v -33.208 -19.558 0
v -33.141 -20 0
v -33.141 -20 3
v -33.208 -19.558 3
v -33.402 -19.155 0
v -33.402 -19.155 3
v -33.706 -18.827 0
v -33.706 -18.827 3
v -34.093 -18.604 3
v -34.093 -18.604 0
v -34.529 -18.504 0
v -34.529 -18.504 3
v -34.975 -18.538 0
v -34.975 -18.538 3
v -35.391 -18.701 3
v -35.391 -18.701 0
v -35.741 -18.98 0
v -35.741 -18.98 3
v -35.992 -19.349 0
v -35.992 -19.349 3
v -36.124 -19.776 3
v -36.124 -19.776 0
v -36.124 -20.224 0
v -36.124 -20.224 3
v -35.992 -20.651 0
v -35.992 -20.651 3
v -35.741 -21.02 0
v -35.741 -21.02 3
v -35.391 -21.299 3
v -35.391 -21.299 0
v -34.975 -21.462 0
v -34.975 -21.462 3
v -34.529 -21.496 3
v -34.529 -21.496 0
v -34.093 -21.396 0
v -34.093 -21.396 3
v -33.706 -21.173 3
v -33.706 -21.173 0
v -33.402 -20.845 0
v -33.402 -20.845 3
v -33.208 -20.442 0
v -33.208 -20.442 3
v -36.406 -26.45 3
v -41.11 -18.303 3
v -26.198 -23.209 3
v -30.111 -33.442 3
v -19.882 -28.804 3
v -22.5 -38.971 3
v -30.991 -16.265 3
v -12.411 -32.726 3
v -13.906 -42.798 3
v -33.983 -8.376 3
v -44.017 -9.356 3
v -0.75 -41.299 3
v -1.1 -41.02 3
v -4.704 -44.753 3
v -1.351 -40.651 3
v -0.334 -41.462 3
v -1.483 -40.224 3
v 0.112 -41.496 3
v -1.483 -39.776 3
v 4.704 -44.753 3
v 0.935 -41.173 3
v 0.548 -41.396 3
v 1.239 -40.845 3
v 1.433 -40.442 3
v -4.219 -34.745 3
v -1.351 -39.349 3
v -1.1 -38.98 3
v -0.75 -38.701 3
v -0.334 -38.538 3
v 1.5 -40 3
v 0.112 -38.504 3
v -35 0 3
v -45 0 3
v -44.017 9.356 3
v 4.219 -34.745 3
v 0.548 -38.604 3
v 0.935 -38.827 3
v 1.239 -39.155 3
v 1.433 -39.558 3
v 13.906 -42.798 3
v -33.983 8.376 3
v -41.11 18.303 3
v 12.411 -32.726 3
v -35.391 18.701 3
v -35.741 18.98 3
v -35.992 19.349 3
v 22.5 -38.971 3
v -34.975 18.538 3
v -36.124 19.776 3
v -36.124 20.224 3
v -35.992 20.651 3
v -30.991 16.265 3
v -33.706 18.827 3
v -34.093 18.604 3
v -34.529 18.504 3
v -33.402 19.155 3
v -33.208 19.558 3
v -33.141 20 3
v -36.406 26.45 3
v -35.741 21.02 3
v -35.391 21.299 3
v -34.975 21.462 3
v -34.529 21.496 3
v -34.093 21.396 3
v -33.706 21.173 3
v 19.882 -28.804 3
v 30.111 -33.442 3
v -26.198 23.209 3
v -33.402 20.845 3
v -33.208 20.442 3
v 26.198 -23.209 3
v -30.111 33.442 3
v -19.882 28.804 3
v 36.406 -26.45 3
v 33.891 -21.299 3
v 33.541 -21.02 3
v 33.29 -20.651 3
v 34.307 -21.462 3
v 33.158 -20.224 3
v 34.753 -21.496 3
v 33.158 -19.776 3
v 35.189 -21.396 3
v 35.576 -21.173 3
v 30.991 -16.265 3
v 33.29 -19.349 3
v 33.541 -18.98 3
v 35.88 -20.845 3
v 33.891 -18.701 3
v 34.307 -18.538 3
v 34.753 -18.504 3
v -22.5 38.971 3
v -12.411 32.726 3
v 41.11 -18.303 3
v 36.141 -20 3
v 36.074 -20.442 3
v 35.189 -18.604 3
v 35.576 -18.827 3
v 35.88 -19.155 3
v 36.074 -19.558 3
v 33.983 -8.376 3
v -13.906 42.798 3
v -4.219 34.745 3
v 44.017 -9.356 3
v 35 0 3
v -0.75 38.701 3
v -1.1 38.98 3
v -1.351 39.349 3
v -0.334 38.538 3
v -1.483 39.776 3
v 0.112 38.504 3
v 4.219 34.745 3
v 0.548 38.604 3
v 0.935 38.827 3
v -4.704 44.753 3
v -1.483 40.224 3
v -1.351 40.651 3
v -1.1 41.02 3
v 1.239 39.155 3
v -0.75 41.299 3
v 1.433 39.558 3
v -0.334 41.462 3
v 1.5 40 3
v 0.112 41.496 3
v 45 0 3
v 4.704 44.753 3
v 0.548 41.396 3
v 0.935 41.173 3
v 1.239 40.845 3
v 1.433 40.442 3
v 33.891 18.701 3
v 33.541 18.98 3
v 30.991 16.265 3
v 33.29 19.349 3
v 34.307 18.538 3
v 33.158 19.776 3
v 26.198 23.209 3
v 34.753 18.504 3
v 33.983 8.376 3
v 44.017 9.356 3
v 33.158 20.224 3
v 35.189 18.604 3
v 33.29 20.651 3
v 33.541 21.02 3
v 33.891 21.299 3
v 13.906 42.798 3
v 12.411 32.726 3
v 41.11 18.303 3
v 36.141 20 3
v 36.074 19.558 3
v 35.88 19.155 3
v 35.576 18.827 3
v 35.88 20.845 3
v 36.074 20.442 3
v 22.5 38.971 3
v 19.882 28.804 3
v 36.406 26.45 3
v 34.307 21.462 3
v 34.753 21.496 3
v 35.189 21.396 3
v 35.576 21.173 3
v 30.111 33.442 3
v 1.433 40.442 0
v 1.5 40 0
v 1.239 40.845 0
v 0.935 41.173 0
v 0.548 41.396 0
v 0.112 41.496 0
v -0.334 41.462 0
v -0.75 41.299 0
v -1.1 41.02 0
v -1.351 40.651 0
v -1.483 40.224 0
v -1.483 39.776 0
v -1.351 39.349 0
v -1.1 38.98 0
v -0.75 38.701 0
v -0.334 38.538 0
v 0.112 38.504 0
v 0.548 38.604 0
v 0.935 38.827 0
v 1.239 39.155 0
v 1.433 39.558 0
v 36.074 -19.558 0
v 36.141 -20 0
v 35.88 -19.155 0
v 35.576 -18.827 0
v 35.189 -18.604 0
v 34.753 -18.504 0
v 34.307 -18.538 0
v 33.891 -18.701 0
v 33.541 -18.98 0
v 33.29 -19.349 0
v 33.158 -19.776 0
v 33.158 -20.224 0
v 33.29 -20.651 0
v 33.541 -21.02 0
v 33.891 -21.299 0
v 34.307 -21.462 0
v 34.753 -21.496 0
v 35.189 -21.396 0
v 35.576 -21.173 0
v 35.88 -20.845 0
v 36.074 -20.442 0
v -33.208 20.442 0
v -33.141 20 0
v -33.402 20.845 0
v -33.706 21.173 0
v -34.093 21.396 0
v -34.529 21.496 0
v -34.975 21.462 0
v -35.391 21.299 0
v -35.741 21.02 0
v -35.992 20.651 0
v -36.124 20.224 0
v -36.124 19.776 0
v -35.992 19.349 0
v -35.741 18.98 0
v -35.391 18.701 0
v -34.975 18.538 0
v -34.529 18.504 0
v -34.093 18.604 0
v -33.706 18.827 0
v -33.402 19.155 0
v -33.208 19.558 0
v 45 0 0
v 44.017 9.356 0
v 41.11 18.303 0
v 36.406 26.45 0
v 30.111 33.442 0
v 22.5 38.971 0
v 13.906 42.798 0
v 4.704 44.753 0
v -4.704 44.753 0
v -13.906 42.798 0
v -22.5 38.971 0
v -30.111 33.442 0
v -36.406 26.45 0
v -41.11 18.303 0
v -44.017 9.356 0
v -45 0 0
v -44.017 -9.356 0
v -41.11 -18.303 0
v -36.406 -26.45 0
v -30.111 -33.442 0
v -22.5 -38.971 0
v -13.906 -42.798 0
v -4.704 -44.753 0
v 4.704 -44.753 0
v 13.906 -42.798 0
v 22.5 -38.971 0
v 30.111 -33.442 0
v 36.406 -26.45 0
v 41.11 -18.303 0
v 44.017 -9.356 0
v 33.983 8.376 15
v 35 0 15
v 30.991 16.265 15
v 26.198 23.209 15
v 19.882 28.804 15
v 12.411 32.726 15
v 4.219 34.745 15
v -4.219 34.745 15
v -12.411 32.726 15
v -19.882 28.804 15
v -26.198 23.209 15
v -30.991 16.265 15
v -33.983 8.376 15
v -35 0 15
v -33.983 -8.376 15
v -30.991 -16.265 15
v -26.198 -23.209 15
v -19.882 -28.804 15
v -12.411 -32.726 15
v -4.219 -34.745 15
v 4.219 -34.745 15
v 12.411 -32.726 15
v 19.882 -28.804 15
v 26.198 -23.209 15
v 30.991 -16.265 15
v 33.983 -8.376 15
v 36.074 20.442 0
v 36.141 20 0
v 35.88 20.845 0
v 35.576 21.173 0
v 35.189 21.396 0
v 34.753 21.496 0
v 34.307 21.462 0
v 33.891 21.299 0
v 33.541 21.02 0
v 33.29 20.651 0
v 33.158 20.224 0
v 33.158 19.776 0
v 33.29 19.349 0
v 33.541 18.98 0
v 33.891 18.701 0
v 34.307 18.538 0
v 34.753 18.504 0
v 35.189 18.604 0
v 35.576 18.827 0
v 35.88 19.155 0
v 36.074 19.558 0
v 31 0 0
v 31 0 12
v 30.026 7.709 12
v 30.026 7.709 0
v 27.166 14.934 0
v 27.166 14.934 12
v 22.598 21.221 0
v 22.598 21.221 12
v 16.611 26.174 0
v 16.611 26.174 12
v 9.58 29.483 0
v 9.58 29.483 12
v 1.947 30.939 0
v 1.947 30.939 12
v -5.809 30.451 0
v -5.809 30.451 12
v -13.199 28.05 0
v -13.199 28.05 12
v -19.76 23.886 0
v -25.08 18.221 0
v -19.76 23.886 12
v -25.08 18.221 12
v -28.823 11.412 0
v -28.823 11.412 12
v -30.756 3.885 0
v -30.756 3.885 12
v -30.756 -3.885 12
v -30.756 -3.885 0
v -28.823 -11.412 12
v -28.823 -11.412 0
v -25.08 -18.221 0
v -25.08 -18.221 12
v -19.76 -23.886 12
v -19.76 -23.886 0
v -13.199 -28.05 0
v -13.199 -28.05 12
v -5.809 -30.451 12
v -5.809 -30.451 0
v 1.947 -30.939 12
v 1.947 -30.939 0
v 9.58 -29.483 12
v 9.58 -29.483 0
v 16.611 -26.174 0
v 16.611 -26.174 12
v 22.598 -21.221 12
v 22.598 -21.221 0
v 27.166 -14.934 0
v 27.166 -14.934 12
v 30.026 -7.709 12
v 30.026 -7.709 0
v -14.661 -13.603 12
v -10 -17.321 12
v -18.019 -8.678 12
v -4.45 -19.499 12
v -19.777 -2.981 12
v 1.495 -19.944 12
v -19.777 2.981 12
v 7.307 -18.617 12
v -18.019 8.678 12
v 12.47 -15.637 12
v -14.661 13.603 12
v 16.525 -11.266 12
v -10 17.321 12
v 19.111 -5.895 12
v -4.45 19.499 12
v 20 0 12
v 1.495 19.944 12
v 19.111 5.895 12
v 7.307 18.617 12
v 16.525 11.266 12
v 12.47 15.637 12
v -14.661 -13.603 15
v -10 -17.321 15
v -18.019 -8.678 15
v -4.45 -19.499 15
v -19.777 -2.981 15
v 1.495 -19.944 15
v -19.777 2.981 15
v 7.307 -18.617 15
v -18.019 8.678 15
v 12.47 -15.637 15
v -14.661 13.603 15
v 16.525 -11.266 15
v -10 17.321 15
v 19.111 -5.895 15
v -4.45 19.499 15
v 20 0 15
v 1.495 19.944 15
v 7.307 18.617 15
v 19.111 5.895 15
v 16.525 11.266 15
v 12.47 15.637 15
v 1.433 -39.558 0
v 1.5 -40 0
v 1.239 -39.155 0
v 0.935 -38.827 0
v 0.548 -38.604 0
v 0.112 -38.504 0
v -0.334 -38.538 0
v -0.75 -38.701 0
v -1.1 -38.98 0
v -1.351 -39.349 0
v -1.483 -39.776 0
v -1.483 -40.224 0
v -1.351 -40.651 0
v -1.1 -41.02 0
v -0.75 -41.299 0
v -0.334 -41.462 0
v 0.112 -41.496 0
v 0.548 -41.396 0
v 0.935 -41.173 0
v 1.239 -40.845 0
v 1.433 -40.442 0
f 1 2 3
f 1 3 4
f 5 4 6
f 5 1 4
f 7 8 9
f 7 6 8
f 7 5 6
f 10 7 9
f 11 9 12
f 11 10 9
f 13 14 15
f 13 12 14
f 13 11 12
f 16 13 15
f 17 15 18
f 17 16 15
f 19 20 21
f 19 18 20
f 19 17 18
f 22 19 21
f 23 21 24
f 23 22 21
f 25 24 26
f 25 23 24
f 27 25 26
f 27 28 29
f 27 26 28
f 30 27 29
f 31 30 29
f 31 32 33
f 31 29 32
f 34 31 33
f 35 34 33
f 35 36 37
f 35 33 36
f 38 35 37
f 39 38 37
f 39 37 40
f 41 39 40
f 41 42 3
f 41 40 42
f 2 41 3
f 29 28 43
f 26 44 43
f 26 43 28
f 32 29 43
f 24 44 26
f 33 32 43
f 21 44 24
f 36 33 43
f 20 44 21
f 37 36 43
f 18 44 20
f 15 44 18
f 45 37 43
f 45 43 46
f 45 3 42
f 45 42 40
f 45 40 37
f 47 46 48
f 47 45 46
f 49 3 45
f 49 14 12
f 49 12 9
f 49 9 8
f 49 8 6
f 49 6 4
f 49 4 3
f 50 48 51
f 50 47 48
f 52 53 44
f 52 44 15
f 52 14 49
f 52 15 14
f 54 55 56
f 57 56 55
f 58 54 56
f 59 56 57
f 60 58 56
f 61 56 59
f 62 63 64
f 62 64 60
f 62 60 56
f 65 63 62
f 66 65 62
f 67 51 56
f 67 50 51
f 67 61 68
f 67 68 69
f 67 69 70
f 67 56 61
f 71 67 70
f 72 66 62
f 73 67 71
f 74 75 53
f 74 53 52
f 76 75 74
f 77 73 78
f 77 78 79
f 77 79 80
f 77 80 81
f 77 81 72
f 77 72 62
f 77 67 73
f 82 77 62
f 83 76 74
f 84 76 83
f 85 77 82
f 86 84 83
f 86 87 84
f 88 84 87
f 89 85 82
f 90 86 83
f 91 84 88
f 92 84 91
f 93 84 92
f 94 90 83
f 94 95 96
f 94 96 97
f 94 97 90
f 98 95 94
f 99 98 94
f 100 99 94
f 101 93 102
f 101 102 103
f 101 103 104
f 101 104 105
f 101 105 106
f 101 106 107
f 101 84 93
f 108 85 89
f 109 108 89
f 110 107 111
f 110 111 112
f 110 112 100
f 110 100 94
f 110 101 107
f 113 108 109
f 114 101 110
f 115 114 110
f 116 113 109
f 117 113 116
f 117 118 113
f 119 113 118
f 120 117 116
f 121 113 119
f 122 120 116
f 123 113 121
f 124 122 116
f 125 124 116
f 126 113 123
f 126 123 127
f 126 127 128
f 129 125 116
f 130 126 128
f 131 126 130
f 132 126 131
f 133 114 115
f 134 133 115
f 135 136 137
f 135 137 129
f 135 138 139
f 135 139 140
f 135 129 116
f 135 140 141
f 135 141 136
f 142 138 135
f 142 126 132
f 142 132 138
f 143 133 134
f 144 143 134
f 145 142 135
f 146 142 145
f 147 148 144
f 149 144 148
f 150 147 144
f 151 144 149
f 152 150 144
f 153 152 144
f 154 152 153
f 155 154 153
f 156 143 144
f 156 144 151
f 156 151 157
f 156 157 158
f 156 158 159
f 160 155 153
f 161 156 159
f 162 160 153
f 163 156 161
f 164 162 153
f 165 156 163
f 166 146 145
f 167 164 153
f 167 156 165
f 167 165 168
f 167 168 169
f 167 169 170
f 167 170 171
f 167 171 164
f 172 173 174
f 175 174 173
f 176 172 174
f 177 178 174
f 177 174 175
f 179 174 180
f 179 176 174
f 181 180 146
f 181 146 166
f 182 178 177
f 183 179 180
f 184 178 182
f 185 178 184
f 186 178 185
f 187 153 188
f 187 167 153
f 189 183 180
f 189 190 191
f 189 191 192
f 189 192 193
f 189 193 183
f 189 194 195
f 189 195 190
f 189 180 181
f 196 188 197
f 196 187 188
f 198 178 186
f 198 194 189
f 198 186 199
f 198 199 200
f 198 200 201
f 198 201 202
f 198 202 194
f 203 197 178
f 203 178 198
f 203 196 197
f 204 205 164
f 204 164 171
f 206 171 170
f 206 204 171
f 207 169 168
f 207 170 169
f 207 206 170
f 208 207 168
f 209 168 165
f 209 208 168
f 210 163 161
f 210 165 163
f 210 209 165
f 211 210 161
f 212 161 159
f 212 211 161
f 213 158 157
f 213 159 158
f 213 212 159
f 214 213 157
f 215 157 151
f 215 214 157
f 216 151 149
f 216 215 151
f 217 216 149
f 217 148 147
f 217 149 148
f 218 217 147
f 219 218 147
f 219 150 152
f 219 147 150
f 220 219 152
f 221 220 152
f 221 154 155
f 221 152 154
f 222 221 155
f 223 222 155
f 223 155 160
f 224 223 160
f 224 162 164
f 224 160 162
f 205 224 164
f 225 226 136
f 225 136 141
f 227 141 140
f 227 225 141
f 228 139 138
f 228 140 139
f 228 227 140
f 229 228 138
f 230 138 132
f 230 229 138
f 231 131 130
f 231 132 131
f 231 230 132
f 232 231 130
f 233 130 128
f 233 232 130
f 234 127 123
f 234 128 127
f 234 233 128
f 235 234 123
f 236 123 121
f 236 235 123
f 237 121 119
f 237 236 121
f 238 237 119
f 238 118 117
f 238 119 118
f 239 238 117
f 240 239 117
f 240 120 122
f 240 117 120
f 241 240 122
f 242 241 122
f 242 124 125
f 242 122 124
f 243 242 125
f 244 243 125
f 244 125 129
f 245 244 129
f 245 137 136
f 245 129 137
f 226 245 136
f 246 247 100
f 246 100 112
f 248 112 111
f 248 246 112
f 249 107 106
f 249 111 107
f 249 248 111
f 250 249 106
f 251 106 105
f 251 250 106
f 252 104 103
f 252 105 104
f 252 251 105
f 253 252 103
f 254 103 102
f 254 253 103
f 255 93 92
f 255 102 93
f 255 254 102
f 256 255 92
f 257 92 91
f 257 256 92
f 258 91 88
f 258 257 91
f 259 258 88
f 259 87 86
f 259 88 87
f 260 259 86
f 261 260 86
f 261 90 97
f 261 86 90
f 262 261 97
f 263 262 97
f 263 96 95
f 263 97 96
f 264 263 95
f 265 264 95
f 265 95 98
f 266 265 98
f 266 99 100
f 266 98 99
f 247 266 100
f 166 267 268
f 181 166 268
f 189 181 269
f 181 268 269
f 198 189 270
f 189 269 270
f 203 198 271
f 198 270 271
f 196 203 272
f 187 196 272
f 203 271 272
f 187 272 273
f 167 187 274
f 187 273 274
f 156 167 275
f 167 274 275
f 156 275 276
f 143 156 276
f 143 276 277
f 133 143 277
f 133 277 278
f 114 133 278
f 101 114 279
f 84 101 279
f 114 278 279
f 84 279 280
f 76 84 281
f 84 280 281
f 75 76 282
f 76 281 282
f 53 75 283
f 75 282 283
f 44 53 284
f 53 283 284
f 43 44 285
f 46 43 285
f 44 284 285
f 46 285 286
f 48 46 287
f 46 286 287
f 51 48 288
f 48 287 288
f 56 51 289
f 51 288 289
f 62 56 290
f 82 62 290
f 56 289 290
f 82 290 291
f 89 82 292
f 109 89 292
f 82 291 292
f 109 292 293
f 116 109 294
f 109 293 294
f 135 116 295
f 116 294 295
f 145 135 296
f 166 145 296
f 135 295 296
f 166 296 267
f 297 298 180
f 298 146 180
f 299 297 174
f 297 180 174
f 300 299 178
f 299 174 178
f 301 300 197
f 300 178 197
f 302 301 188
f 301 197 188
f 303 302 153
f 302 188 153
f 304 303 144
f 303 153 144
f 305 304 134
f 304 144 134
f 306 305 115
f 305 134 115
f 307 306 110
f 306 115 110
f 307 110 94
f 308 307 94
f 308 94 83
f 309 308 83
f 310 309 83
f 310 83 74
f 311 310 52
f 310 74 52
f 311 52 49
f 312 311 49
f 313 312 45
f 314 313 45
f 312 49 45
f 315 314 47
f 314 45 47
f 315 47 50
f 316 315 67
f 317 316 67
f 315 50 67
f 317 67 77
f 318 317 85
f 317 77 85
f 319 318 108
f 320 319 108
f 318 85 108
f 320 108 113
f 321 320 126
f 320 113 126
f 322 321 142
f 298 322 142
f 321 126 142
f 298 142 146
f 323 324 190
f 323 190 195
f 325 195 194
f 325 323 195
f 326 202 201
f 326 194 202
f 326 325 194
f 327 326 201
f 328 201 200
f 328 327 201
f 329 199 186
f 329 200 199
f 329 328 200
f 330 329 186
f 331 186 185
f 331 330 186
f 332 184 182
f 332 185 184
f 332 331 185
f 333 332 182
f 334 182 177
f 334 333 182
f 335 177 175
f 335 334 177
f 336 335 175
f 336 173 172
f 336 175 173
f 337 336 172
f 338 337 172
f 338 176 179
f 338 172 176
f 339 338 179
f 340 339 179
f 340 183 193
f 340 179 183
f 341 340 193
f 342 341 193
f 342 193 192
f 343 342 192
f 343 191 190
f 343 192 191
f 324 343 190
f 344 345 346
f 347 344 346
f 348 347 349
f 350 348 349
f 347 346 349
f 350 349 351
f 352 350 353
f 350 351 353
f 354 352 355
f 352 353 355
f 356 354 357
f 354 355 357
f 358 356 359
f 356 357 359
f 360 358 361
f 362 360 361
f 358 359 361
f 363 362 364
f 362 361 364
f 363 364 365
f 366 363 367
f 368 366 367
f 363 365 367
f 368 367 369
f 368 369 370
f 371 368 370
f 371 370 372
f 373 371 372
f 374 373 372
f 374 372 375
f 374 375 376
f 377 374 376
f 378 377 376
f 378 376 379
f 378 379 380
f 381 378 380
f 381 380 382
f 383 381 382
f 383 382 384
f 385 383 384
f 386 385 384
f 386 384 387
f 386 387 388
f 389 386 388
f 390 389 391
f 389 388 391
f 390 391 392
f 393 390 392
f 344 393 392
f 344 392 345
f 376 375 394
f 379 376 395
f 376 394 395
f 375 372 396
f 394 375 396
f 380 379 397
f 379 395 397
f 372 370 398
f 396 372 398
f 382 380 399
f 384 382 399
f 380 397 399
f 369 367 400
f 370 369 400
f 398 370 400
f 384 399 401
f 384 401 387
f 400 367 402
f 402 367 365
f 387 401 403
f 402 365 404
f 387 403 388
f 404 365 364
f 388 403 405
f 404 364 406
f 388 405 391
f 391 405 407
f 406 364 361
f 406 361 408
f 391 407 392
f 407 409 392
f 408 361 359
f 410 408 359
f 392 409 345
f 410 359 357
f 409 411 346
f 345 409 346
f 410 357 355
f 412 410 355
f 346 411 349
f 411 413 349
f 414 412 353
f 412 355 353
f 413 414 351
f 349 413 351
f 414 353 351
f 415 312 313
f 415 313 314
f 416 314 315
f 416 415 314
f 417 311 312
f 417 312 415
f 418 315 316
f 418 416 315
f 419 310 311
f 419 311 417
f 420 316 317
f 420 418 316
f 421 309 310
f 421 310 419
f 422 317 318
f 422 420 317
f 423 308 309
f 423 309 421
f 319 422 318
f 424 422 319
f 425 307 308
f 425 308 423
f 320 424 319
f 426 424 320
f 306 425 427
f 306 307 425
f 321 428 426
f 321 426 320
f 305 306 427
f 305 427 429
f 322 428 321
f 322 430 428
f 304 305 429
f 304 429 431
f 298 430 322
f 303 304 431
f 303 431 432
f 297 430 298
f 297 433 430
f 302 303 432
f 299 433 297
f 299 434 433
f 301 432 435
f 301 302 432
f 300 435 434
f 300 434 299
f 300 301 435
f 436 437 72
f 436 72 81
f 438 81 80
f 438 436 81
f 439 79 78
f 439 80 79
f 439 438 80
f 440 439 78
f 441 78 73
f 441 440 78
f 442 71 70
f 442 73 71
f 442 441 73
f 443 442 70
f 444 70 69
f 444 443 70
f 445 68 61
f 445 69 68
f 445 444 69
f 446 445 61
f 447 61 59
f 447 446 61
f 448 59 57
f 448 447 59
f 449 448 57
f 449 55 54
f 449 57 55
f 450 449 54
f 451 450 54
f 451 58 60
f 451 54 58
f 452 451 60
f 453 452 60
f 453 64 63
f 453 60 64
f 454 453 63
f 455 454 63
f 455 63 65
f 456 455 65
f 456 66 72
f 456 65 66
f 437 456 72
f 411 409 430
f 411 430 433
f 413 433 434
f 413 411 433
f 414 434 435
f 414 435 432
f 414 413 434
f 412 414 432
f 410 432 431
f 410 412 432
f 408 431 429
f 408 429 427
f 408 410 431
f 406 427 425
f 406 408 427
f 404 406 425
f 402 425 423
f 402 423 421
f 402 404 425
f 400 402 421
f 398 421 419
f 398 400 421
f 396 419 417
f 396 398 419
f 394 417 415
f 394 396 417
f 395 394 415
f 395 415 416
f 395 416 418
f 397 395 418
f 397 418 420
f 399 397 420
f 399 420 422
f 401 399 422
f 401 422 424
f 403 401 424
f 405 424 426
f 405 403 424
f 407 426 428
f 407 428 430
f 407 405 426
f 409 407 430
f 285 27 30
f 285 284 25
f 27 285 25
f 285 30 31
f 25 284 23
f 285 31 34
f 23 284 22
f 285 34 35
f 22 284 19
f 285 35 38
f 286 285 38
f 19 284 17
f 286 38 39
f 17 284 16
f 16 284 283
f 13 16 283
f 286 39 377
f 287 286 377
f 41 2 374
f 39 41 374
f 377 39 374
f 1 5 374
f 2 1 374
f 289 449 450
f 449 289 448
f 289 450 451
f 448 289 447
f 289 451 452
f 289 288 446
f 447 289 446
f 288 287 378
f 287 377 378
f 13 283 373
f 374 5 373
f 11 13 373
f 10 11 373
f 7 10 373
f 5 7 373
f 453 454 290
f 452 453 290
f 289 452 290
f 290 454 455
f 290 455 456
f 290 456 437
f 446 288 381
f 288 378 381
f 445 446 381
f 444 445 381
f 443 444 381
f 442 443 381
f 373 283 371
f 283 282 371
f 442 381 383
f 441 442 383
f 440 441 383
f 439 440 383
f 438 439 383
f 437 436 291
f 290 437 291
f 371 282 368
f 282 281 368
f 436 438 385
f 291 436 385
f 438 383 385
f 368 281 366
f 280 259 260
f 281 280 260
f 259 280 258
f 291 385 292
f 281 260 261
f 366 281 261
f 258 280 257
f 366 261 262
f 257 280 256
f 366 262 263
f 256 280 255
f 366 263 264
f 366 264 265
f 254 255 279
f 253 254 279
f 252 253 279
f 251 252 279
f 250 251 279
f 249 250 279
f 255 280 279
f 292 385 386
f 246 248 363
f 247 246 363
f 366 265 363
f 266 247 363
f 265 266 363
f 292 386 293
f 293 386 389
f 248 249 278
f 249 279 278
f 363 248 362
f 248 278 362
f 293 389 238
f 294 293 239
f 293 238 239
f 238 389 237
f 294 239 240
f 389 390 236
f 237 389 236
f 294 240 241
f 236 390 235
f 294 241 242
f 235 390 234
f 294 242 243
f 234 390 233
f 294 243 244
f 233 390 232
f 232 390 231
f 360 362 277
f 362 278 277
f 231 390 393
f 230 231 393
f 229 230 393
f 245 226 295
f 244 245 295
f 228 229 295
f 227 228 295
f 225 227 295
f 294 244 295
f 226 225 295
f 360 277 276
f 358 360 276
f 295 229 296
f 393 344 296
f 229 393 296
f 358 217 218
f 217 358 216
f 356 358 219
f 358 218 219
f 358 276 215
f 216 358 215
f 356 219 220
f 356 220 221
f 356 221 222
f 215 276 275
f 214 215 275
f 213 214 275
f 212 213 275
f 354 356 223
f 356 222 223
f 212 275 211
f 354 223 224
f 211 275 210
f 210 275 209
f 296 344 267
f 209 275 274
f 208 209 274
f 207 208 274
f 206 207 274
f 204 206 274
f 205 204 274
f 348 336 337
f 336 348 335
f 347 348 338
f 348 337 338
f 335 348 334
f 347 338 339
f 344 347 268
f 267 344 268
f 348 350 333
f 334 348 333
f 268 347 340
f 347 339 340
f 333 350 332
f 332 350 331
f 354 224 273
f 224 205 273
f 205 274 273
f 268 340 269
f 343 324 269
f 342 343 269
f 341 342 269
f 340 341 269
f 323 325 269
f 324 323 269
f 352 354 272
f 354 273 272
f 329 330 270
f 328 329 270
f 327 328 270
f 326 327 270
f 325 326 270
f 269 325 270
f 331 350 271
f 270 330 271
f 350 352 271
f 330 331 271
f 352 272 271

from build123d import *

# Parameters (mm, degrees)
SKETCH1_R               = 45
BOSS_EXTRUDE3_DEPTH     = 3
SKETCH2_R               = 35
BOSS_EXTRUDE4_DEPTH     = 12
SKETCH3_R               = 31
CUT_EXTRUDE2_DEPTH      = 66.383484153
BOSS_EXTRUDE5_START     = -3
SKETCH4_R               = 35
SKETCH4_R_2             = 20
BOSS_EXTRUDE5_DEPTH     = 3
CUT_EXTRUDE3_DEPTH      = 65.761099435
CUT_EXTRUDE3_DEPTH_BACK = 65.761099435
SKETCH5_R               = 1.5


with BuildPart() as part:
    # Sketch1 → Boss-Extrude3 (new body)
    with BuildSketch(Plane.XY):
        Circle(SKETCH1_R)
    extrude(amount=BOSS_EXTRUDE3_DEPTH)

    # Sketch2 → Boss-Extrude4 (add)
    with BuildSketch(Plane.XY.offset(3)):
        Circle(SKETCH2_R)
    extrude(amount=BOSS_EXTRUDE4_DEPTH)

    # Sketch3 → Cut-Extrude2 (cut, through all)
    with BuildSketch(Plane.XY.offset(15)):
        Circle(SKETCH3_R)
    extrude(amount=-CUT_EXTRUDE2_DEPTH, mode=Mode.SUBTRACT)

    # Sketch4 → Boss-Extrude5 (add)
    with BuildSketch(Plane.XY.offset(15).offset(BOSS_EXTRUDE5_START)):
        Circle(SKETCH4_R)
        Circle(SKETCH4_R_2, mode=Mode.SUBTRACT)
    extrude(amount=BOSS_EXTRUDE5_DEPTH)

    # Sketch5 → Cut-Extrude3 (cut, two sides: drawn at the far end of the back side and taken through both)
    with BuildSketch(Plane.XY.offset(3).offset(-CUT_EXTRUDE3_DEPTH_BACK)):
        with Locations((0, 40)):
            Circle(SKETCH5_R)
        with Locations((34.641016151, 20)):
            Circle(SKETCH5_R)
        with Locations((34.641016151, -20)):
            Circle(SKETCH5_R)
        with Locations((0, -40)):
            Circle(SKETCH5_R)
        with Locations((-34.641016151, -20)):
            Circle(SKETCH5_R)
        with Locations((-34.641016151, 20)):
            Circle(SKETCH5_R)
    extrude(amount=CUT_EXTRUDE3_DEPTH + CUT_EXTRUDE3_DEPTH_BACK, mode=Mode.SUBTRACT)


solid = part.part
